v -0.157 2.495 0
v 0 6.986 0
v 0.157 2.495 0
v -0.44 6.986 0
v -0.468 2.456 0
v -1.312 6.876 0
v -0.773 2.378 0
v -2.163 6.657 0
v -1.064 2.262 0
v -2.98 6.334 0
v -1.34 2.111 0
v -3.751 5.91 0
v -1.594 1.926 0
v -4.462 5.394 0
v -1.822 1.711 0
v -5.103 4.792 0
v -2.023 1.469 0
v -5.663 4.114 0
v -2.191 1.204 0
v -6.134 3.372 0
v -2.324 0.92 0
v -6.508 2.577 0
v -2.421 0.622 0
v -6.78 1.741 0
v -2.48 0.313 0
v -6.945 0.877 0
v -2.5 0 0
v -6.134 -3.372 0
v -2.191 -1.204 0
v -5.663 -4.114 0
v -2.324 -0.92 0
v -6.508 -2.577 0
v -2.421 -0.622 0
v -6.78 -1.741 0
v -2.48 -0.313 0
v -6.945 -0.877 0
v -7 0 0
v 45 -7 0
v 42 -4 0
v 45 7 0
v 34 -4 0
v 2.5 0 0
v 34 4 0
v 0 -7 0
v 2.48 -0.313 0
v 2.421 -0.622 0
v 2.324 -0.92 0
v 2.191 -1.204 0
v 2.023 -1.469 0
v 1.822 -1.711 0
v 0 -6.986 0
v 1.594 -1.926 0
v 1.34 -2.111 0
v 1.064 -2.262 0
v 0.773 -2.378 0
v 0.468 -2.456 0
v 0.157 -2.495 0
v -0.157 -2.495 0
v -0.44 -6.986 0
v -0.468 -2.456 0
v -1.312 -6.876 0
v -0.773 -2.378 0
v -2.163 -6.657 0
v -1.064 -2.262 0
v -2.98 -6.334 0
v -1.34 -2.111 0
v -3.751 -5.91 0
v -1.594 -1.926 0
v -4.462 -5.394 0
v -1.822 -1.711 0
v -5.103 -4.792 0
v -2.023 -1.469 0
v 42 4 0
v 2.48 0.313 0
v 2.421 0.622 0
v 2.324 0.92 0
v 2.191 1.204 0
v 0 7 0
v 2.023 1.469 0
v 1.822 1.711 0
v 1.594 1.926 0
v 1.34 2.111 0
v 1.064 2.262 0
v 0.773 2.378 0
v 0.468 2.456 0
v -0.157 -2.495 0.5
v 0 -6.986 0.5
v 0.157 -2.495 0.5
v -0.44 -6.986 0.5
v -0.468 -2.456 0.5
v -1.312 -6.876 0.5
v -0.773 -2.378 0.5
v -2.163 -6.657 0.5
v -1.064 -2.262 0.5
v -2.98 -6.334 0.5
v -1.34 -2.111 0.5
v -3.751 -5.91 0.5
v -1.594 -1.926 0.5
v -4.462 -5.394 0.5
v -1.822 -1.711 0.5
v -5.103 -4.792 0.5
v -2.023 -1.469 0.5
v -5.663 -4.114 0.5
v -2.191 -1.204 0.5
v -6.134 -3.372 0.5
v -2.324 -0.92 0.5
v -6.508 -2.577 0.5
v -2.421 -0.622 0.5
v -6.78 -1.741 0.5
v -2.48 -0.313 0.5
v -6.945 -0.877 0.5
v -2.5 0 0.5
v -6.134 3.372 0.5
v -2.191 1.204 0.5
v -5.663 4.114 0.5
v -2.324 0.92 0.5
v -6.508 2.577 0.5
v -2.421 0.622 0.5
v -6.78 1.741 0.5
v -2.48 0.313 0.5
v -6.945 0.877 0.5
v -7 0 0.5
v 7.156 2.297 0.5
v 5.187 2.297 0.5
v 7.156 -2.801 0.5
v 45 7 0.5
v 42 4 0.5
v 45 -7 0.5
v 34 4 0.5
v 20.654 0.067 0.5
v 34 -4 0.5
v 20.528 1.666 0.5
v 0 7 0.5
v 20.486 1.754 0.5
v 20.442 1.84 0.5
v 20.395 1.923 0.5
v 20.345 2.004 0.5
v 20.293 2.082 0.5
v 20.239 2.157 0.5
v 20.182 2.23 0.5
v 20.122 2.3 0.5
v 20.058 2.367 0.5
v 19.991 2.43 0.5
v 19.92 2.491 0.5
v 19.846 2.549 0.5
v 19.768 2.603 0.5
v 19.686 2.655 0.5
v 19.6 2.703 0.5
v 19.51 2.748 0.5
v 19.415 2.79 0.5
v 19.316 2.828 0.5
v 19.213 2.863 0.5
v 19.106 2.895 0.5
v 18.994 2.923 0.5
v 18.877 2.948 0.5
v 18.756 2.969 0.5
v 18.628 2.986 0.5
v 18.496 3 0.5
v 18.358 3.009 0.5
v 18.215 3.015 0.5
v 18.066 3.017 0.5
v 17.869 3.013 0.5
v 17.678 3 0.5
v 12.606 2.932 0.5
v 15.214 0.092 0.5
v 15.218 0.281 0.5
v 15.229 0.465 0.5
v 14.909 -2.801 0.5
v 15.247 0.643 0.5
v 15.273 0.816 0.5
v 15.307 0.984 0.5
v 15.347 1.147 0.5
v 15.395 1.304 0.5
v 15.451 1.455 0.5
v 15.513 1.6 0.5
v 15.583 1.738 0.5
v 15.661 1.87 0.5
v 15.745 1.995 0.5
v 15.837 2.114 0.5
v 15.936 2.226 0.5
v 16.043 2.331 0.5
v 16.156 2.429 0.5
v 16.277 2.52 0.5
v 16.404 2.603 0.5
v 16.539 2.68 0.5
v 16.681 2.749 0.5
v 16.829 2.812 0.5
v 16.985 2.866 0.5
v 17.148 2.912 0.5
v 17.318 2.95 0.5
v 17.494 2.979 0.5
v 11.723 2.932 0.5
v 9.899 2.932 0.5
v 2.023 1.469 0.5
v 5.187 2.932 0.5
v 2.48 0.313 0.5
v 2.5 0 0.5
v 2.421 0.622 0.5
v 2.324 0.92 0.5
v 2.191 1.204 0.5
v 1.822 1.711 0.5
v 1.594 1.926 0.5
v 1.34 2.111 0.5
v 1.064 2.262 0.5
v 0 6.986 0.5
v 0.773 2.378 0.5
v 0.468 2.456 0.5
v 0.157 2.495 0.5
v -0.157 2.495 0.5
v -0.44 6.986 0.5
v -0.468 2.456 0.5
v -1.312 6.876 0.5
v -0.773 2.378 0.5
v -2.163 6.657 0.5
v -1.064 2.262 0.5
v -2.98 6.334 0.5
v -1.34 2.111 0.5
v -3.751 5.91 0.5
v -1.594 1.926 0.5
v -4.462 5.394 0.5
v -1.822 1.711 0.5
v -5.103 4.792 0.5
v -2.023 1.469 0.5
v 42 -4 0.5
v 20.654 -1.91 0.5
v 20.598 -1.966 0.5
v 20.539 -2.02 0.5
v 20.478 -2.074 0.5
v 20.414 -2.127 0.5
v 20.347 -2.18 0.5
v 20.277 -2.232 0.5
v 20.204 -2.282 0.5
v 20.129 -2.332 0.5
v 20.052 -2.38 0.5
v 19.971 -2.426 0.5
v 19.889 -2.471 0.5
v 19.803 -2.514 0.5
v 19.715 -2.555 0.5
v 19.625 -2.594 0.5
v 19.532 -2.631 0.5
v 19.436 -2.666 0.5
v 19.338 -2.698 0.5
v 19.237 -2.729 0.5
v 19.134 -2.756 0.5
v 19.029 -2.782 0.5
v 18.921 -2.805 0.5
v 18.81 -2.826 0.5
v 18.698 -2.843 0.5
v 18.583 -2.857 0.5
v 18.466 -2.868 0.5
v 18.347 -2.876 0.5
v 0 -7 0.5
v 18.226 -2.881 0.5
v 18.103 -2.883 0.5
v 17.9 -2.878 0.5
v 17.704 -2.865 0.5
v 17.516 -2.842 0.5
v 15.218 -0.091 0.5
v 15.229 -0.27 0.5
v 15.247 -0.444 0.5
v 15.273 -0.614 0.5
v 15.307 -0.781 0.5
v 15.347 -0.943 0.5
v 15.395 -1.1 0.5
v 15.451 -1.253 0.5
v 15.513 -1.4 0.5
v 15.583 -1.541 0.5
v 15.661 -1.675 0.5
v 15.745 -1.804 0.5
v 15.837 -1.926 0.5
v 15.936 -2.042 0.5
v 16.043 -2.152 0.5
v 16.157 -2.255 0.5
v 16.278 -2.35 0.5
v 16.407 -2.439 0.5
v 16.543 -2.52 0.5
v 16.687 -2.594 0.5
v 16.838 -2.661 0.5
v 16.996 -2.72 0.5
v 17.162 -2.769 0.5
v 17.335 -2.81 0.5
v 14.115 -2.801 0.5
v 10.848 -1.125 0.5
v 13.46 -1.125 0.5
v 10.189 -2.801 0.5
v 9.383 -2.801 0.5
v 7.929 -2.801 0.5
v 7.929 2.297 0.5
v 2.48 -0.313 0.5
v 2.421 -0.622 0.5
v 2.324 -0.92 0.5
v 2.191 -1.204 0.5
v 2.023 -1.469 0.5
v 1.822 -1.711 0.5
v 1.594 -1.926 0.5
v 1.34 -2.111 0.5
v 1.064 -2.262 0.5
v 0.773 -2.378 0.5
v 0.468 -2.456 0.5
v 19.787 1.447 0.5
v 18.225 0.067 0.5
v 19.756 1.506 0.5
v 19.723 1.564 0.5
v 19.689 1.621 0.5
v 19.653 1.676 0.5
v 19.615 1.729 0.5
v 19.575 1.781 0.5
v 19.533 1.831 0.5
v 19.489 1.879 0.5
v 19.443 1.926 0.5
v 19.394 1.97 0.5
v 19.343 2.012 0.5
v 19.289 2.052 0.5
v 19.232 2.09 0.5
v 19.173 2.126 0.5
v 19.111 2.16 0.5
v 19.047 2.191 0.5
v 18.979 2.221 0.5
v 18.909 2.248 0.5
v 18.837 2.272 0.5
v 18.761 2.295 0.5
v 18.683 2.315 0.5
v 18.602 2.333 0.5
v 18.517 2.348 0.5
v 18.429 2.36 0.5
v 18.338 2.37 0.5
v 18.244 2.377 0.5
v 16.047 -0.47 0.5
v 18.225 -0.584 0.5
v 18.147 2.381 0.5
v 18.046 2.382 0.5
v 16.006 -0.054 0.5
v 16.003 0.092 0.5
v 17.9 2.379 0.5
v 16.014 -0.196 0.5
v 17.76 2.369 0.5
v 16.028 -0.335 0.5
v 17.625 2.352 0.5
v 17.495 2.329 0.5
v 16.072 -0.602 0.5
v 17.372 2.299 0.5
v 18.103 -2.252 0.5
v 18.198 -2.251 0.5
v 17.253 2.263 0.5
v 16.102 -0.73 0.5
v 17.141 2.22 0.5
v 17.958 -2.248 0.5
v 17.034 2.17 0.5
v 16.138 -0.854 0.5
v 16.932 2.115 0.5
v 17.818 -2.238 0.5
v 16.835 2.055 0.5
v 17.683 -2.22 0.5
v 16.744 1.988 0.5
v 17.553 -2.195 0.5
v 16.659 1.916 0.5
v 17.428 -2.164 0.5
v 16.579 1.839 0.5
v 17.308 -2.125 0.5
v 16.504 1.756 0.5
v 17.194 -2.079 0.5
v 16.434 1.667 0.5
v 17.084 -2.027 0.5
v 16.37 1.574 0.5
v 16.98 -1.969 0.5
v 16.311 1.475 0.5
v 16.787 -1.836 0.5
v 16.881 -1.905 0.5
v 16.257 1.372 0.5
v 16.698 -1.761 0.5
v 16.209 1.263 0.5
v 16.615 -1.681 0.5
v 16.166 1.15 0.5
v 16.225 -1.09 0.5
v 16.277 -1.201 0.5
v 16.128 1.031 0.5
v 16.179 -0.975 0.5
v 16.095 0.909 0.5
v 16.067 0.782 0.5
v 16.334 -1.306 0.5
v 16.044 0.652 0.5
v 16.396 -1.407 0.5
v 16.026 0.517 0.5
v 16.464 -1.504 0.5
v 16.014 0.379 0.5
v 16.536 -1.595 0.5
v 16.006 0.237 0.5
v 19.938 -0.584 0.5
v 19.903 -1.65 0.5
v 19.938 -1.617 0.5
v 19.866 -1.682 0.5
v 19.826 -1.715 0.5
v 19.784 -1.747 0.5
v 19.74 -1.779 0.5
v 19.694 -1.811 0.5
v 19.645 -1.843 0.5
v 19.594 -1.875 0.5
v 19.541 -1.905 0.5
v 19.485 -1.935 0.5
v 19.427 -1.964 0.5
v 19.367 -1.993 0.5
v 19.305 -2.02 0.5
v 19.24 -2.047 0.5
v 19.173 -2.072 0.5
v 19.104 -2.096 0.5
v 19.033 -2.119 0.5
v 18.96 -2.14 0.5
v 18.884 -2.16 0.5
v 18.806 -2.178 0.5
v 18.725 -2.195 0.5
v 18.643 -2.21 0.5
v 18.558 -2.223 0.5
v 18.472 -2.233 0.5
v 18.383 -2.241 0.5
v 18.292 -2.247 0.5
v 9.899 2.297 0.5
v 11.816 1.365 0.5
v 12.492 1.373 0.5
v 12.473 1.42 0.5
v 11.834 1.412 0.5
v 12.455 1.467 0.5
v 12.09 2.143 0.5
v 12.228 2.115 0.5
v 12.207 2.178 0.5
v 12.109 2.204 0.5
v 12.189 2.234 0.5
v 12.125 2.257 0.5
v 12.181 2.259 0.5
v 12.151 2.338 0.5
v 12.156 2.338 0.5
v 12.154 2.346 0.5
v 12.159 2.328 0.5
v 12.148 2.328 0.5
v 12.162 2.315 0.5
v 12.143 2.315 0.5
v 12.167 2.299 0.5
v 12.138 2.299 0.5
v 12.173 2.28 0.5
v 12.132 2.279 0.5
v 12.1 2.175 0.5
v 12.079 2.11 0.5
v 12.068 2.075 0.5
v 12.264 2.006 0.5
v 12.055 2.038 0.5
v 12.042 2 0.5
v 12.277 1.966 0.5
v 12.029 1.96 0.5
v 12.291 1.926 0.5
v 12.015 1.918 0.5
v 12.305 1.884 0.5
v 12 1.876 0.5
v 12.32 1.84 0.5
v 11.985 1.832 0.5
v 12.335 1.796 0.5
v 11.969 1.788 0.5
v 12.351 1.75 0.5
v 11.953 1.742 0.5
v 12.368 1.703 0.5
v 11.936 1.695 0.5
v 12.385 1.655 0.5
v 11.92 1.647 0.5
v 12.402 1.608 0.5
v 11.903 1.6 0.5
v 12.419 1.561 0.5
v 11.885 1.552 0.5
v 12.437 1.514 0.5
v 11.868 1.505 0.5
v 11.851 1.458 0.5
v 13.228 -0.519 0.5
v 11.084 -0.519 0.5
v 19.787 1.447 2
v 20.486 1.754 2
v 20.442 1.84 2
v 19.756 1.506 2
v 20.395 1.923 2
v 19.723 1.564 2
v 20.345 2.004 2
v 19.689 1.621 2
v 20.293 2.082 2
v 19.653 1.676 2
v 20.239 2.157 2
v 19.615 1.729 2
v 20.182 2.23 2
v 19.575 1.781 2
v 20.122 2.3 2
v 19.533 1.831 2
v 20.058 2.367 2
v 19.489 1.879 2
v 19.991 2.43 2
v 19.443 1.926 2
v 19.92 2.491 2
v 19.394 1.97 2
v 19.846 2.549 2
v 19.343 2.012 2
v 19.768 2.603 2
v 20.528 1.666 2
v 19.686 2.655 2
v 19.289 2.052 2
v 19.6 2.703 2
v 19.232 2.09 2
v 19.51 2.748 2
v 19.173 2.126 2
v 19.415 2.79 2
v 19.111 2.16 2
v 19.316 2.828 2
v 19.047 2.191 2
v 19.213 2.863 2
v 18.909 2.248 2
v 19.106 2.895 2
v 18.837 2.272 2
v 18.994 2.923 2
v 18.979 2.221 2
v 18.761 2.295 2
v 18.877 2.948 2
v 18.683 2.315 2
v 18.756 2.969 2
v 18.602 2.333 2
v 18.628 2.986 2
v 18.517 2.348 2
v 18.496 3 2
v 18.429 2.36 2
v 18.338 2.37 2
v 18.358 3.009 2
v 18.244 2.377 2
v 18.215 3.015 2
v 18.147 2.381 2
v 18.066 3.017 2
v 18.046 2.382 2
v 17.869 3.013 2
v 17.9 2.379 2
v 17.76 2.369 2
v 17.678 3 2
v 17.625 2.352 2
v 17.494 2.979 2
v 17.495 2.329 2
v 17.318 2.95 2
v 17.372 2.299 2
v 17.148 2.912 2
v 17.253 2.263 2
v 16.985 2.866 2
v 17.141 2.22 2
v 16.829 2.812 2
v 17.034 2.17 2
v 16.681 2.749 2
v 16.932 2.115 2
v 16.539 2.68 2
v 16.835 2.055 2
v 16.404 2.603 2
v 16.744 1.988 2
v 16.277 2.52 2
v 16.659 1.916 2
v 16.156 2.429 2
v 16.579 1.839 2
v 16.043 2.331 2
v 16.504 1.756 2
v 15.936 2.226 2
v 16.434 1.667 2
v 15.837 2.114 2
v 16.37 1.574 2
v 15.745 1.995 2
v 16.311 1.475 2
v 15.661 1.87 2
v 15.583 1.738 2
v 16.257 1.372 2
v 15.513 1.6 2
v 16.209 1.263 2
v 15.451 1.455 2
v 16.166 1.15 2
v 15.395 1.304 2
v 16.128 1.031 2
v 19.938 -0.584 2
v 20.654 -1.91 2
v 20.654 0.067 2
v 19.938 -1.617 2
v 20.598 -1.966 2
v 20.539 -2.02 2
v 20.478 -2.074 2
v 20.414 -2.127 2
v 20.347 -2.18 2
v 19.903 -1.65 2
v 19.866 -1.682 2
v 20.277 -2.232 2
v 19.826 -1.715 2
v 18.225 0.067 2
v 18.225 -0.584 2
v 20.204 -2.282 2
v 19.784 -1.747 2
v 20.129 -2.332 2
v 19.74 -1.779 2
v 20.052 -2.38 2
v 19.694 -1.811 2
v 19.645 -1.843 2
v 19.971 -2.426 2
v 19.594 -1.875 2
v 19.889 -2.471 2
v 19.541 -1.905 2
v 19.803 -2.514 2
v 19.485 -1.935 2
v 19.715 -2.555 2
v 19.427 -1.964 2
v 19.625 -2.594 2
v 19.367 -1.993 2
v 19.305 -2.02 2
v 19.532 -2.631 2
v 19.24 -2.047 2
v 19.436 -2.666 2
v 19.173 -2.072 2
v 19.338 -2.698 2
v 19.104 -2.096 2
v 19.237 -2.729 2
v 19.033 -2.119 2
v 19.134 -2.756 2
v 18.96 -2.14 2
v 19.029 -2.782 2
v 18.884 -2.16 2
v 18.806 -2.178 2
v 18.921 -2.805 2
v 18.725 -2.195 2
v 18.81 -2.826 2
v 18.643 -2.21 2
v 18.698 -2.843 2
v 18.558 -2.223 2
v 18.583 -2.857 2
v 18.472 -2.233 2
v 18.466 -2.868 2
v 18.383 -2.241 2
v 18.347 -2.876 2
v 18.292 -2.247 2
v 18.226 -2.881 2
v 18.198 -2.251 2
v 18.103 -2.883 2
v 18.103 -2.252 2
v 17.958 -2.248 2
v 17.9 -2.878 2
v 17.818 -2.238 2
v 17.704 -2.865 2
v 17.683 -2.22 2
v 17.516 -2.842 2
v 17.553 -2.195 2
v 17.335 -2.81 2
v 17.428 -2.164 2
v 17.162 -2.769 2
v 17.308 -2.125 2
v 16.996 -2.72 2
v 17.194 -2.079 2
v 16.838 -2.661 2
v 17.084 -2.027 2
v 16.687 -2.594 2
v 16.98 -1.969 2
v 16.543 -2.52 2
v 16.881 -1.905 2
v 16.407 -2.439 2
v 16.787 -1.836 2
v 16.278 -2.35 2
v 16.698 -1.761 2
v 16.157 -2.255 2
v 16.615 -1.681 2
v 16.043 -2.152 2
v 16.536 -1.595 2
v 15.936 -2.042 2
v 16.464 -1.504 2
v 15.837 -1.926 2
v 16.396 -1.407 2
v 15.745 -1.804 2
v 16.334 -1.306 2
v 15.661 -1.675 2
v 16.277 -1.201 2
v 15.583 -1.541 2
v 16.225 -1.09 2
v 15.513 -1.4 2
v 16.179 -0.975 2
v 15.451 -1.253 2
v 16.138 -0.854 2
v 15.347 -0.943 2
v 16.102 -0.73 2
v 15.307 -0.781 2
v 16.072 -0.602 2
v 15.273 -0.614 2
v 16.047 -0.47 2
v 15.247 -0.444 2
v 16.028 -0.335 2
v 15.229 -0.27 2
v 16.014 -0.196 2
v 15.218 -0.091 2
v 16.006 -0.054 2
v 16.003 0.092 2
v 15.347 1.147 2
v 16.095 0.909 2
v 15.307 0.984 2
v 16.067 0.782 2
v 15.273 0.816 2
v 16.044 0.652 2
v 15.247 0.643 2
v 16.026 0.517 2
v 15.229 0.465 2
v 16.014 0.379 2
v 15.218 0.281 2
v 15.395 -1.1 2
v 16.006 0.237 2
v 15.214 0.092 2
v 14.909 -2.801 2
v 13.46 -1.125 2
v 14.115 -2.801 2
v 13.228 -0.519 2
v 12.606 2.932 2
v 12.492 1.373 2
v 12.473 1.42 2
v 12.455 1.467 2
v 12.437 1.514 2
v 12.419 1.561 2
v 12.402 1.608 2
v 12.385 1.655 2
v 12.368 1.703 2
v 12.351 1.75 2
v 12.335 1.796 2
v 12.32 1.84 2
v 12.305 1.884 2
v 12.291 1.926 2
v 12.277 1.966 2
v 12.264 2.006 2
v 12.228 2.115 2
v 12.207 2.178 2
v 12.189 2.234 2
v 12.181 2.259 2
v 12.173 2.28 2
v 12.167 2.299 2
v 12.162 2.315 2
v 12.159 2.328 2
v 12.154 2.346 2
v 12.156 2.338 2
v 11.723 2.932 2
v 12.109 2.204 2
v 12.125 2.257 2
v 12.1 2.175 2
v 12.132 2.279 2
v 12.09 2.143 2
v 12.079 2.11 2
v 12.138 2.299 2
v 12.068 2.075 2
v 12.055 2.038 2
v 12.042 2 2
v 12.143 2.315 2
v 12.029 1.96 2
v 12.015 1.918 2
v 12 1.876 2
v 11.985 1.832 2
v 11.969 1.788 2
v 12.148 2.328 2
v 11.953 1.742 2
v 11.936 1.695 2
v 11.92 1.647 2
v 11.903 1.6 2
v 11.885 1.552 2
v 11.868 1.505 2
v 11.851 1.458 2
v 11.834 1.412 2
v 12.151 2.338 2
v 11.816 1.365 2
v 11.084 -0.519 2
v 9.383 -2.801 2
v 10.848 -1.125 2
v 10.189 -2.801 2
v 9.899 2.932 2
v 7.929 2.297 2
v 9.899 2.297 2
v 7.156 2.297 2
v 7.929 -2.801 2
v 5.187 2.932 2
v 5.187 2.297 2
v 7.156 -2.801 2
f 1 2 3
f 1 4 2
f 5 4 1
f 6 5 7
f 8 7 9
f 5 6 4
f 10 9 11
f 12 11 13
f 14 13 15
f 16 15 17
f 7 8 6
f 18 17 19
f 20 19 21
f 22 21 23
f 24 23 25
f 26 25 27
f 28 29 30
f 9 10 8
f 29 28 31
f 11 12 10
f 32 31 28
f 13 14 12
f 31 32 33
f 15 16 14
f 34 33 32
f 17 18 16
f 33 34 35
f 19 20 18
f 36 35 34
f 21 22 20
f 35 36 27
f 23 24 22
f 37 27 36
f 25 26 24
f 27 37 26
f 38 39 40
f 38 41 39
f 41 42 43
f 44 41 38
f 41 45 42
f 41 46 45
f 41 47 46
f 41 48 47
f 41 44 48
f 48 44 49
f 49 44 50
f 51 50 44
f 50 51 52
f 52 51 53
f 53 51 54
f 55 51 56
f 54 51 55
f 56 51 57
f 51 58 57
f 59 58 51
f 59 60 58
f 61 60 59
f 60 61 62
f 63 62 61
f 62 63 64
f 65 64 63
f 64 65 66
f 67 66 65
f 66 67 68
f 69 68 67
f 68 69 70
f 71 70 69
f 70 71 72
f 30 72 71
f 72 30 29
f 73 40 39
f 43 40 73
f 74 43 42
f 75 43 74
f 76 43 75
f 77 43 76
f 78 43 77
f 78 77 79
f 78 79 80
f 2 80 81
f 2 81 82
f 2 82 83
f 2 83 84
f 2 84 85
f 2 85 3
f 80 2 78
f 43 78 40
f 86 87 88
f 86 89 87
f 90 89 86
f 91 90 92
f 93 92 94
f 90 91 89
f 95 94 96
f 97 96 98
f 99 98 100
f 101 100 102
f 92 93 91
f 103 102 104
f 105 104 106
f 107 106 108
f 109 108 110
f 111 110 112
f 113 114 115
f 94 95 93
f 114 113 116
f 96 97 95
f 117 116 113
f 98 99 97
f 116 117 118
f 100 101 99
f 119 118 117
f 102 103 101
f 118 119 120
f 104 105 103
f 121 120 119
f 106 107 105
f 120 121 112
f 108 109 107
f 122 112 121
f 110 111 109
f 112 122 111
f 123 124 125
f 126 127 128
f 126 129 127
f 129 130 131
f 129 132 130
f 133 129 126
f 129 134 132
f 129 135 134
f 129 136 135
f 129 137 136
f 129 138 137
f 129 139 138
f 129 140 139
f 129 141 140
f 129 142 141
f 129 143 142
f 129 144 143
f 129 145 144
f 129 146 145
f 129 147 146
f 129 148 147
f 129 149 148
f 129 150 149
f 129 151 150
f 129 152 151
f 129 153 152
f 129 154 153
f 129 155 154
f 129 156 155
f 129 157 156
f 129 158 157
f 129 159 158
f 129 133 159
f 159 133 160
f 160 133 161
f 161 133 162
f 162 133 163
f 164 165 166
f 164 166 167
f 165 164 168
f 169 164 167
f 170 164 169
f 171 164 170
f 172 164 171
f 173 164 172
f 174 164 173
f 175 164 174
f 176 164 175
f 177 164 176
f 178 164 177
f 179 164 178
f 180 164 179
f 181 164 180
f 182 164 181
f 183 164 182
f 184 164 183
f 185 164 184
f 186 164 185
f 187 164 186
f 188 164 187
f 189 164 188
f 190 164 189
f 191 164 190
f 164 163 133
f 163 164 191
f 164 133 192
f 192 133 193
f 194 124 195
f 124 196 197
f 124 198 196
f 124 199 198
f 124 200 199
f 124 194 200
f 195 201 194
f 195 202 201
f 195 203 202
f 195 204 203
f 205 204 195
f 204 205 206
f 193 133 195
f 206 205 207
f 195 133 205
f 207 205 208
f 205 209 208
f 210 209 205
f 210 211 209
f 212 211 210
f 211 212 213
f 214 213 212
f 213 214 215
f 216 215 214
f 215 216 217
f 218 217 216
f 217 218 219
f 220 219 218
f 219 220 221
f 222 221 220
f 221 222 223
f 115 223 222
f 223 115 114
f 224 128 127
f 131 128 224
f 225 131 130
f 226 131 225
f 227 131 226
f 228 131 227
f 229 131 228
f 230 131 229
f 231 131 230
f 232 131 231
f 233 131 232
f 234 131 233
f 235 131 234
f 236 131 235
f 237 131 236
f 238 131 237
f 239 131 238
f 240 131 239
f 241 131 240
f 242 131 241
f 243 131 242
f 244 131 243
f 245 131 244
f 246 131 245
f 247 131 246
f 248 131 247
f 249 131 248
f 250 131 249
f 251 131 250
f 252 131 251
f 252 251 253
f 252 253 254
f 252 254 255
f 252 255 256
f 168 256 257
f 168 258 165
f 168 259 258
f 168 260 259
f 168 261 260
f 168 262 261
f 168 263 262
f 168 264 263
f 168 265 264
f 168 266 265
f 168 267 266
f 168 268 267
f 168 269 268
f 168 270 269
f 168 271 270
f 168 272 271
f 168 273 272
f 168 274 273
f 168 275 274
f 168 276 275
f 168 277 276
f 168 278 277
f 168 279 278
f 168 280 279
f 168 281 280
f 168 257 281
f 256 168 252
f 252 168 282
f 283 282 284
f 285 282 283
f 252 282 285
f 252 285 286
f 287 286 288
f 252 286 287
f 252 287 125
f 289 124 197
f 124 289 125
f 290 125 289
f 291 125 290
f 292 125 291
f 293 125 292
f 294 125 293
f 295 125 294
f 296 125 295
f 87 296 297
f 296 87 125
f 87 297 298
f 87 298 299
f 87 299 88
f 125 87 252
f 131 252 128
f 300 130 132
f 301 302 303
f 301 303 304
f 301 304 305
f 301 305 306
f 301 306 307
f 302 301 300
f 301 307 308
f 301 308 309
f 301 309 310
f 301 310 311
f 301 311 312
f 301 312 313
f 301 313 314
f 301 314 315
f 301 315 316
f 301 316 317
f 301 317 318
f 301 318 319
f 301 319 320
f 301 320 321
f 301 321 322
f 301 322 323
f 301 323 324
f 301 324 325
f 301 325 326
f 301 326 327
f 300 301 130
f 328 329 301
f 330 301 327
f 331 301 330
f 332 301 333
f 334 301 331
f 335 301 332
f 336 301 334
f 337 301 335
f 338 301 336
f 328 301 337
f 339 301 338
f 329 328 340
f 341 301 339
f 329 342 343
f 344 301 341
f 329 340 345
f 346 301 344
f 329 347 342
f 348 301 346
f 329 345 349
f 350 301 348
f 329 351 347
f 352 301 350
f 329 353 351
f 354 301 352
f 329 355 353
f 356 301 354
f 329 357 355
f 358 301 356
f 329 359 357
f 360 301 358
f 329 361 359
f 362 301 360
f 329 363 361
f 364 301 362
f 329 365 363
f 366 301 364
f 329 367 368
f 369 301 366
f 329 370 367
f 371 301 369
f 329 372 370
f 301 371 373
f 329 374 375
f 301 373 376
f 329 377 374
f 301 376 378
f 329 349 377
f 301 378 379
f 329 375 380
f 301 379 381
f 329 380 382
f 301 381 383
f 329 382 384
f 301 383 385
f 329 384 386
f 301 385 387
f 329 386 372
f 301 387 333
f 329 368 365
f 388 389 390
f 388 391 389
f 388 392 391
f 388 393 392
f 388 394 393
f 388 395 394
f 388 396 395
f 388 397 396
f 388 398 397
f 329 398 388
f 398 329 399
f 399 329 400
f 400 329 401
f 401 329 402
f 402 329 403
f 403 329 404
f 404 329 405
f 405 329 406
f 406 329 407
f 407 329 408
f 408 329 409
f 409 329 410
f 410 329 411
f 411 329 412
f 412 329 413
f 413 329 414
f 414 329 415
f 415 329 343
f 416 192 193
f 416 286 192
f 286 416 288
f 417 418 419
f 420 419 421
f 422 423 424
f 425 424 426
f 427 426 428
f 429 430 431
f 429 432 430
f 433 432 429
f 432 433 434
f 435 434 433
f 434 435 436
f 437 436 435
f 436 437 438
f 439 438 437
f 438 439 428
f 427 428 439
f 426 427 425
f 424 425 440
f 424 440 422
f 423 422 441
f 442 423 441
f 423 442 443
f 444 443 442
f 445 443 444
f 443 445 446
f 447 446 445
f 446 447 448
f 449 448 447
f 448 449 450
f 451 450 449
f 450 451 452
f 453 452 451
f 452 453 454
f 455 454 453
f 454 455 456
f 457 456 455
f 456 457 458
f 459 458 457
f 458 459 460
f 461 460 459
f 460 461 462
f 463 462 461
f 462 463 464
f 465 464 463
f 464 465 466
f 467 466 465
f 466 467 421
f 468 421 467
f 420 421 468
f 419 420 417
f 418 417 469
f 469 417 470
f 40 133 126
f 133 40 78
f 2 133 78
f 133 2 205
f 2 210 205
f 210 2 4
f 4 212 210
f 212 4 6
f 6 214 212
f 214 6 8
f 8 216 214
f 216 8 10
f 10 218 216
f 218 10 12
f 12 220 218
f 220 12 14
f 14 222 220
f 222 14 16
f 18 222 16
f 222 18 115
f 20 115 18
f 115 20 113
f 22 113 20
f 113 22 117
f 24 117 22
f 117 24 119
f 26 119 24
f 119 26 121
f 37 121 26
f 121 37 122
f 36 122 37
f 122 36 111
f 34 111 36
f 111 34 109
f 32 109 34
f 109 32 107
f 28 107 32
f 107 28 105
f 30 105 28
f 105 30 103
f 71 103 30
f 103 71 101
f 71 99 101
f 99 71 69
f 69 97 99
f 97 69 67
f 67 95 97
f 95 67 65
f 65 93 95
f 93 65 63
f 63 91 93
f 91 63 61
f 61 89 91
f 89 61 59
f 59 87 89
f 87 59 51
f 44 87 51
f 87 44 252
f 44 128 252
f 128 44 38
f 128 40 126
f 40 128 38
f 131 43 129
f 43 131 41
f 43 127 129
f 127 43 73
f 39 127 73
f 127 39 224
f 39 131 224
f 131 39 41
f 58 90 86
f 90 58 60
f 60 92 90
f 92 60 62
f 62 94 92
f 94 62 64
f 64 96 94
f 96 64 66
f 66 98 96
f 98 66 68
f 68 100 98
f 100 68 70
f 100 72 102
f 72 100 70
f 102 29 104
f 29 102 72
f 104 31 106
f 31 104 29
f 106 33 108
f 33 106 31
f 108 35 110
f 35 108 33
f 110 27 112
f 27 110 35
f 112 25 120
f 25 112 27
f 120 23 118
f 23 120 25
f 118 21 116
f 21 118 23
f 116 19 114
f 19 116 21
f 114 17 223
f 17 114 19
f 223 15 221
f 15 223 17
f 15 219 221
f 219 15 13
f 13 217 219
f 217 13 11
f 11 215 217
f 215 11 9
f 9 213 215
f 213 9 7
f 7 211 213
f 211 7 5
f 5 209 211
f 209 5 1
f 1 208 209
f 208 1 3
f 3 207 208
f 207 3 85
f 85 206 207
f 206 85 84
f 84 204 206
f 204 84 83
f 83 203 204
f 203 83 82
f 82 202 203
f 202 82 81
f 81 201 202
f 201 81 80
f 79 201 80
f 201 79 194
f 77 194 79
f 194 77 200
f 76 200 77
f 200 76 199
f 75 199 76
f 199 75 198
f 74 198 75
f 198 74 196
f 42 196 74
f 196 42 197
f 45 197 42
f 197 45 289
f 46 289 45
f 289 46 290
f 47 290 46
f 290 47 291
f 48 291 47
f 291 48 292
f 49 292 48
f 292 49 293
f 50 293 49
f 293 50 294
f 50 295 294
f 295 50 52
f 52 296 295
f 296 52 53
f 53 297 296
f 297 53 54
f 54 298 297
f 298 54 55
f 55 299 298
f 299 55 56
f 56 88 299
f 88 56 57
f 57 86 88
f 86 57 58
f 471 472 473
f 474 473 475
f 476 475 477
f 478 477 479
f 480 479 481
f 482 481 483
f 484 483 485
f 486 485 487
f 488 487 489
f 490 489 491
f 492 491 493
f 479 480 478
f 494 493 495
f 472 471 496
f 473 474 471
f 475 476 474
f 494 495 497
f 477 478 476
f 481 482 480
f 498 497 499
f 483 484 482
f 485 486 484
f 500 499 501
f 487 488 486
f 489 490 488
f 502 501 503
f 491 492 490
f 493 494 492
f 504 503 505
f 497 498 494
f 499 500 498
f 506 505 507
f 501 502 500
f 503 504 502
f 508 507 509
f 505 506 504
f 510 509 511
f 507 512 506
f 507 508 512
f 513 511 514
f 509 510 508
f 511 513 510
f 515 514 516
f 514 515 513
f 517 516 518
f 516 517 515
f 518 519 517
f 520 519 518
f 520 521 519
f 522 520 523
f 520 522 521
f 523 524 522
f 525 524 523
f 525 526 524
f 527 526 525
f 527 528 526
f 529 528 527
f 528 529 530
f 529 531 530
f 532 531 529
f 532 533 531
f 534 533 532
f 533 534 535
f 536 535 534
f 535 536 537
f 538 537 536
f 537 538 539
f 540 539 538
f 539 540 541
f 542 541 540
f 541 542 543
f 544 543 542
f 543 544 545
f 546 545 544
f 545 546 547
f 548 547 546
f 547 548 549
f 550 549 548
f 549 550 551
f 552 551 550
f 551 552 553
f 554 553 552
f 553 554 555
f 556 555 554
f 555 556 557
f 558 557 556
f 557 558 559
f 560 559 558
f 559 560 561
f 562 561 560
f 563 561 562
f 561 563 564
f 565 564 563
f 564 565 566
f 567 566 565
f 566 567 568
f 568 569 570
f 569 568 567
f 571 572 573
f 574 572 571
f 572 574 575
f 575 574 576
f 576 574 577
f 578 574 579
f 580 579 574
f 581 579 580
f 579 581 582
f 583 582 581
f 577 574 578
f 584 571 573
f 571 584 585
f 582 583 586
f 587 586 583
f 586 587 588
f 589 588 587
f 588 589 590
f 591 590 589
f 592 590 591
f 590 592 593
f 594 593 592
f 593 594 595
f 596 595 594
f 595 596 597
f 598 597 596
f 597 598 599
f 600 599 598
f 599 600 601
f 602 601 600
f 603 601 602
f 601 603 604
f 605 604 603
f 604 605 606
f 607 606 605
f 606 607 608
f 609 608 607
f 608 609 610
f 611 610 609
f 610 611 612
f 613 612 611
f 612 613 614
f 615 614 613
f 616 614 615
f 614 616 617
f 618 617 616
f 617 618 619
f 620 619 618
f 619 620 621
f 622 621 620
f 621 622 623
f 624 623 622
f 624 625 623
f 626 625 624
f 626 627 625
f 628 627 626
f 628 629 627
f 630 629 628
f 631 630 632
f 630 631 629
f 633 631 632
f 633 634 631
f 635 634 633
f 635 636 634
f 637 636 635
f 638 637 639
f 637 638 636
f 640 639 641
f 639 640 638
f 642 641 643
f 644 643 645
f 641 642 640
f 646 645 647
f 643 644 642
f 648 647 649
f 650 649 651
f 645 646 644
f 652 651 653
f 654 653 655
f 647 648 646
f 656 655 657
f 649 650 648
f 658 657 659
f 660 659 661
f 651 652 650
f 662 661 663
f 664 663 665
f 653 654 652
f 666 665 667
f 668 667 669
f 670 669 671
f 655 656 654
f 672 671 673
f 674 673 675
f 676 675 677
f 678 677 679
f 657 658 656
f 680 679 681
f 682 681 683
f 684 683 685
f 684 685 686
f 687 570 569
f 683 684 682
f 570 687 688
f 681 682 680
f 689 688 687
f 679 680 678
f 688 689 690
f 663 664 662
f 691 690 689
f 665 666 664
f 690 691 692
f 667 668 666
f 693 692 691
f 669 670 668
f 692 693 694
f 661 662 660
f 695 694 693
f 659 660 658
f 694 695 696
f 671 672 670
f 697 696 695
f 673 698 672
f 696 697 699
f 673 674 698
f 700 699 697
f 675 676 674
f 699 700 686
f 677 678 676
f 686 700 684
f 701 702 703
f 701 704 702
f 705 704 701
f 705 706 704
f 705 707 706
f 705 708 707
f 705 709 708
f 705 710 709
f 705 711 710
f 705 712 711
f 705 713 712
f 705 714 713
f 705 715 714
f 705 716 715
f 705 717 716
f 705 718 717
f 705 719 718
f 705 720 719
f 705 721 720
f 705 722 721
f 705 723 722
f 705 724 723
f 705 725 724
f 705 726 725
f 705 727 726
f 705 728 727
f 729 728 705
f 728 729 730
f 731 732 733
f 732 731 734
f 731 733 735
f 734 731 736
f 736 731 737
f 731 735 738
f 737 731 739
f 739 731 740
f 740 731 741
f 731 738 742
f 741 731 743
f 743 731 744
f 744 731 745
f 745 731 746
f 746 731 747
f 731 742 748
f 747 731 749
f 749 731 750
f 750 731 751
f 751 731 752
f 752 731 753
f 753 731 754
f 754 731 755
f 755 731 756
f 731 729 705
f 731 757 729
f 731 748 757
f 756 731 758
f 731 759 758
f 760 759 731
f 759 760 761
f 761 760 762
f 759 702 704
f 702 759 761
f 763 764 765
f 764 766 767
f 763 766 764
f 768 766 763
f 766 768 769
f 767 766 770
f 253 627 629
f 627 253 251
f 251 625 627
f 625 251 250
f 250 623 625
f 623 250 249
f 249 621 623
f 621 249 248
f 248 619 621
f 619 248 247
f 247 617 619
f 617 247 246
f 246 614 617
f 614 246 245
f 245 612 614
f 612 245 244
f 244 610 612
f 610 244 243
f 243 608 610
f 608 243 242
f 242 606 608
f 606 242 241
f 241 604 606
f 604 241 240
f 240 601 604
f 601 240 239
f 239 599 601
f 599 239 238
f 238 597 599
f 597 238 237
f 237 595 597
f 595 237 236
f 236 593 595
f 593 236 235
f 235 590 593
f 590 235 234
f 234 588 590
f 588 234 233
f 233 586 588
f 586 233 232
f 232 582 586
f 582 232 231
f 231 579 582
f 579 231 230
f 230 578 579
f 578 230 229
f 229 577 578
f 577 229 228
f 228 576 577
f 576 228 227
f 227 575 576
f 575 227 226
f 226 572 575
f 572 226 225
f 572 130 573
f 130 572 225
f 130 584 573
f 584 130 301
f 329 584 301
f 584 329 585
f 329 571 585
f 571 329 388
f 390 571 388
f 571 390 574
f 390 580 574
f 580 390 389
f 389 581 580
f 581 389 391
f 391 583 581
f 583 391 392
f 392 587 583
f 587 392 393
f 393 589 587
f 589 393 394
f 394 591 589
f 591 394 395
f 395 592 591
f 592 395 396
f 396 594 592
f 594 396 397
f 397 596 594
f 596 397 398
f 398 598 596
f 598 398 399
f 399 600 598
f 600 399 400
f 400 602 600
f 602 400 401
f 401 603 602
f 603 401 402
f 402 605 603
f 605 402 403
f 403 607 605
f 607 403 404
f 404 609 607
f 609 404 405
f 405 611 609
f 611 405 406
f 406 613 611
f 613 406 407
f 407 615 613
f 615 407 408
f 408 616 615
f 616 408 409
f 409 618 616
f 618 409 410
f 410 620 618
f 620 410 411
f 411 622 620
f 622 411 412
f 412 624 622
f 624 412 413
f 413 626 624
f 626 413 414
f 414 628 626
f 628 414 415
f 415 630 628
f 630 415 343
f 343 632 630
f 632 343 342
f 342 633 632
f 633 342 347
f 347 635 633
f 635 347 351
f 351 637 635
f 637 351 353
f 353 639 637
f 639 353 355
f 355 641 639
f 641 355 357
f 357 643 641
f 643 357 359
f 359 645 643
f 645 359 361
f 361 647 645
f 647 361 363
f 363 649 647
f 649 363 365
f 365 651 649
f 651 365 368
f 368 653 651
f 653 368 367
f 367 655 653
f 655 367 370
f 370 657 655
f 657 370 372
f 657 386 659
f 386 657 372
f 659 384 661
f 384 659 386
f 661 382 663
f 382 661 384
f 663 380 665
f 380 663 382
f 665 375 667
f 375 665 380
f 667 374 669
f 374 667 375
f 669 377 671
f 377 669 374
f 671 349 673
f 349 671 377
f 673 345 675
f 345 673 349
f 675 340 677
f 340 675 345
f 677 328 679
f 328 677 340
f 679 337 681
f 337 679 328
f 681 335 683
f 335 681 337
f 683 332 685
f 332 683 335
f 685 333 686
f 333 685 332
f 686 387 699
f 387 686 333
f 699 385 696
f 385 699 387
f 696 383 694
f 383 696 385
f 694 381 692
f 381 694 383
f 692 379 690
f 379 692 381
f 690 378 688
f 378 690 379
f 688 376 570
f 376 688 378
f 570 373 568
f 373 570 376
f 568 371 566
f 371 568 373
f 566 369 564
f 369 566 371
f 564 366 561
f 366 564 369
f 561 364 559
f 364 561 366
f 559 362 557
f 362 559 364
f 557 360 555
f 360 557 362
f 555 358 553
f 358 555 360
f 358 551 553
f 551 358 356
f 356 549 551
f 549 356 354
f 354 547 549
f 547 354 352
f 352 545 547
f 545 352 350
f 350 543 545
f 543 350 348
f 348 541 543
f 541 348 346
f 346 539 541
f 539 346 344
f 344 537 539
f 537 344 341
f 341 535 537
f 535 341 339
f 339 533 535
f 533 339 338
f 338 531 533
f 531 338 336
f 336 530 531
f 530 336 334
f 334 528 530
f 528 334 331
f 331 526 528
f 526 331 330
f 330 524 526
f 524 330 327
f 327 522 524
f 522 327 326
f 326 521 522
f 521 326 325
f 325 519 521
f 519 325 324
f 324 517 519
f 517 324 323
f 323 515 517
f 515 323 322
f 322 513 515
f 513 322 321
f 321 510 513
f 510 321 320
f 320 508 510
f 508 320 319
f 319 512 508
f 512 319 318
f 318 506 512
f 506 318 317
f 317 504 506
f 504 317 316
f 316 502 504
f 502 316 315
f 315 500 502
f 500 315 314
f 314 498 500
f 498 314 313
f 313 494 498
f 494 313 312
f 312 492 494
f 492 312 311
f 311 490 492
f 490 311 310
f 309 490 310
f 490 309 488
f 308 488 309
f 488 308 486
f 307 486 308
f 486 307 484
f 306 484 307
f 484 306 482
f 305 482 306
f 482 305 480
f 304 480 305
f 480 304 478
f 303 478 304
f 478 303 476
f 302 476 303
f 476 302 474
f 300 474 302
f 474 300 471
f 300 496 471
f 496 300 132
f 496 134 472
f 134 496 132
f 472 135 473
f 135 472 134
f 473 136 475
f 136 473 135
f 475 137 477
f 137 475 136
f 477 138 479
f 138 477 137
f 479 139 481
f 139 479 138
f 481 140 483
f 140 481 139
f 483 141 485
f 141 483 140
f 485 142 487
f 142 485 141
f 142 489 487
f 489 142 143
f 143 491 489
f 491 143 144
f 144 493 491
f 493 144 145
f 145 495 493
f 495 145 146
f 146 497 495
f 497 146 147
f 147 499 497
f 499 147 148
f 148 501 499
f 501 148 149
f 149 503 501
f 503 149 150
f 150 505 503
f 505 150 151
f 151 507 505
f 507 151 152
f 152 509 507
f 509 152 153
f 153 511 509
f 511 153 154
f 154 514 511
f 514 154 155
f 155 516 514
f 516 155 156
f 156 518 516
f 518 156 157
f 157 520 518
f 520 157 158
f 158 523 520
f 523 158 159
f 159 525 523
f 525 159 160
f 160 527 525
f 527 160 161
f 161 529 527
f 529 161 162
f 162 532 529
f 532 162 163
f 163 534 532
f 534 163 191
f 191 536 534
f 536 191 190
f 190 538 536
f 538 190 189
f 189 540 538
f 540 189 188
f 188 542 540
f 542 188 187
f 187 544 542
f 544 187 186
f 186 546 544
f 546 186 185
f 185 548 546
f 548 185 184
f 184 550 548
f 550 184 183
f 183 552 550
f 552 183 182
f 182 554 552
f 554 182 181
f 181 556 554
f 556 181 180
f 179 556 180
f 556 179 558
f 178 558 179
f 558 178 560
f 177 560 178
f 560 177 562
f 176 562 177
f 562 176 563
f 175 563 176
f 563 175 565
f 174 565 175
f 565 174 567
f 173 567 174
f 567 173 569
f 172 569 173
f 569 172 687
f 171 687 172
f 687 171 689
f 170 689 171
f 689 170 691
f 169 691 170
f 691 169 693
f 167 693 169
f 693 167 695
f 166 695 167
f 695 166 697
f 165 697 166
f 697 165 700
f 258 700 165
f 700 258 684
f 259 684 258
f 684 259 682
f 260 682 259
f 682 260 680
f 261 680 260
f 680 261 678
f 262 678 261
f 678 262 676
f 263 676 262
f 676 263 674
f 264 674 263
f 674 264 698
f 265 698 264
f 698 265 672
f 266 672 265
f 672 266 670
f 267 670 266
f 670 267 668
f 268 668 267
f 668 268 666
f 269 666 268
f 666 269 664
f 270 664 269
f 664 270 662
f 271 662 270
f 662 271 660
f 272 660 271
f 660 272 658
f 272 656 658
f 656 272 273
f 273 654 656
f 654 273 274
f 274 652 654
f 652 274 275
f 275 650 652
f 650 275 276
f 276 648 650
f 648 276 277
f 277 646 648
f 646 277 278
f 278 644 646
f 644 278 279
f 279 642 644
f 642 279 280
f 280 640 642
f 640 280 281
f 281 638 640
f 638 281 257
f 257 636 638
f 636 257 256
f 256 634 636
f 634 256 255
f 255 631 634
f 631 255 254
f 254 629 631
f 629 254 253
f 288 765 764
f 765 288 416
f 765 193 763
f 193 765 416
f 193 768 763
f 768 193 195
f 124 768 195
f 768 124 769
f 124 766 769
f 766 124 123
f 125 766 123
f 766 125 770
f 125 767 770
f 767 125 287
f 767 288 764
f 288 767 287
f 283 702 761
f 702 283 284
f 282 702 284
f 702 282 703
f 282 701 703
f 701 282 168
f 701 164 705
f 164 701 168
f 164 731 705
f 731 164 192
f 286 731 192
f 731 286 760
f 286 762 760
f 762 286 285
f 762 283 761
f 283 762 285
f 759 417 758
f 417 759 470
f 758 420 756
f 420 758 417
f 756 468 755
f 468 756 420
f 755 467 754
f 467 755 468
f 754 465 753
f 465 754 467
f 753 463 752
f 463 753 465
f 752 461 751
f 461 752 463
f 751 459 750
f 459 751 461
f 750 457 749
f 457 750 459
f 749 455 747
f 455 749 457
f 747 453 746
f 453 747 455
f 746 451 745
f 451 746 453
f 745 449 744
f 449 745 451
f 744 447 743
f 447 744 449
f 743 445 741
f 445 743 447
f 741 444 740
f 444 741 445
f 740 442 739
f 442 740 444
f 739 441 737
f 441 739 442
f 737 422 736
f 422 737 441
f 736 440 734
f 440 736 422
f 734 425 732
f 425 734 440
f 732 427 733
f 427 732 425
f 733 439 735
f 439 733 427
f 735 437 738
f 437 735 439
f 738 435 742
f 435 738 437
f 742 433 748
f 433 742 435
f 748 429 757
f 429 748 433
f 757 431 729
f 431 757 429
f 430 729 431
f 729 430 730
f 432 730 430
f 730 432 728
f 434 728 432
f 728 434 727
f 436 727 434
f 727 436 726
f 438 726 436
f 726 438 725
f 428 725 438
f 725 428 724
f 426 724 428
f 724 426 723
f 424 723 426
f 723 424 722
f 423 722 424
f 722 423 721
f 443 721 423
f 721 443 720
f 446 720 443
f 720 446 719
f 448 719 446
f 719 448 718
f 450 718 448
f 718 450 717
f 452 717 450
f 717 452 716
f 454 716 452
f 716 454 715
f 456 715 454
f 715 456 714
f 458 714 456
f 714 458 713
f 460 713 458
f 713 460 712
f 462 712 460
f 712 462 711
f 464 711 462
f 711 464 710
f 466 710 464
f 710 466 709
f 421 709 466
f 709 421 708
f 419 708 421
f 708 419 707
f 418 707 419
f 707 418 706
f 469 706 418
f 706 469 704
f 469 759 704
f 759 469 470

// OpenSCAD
$fn = 50;
linear_extrude(0.5)  difference() {
    union() {
        circle(d = 14);
        translate([0, -7]) square([45, 14]);
    }
    circle(d = 5);
    translate([34, -4]) square(8);
}
linear_extrude(2) translate([5, 0]) text("TAG", size=6, halign="left", valign="center");
